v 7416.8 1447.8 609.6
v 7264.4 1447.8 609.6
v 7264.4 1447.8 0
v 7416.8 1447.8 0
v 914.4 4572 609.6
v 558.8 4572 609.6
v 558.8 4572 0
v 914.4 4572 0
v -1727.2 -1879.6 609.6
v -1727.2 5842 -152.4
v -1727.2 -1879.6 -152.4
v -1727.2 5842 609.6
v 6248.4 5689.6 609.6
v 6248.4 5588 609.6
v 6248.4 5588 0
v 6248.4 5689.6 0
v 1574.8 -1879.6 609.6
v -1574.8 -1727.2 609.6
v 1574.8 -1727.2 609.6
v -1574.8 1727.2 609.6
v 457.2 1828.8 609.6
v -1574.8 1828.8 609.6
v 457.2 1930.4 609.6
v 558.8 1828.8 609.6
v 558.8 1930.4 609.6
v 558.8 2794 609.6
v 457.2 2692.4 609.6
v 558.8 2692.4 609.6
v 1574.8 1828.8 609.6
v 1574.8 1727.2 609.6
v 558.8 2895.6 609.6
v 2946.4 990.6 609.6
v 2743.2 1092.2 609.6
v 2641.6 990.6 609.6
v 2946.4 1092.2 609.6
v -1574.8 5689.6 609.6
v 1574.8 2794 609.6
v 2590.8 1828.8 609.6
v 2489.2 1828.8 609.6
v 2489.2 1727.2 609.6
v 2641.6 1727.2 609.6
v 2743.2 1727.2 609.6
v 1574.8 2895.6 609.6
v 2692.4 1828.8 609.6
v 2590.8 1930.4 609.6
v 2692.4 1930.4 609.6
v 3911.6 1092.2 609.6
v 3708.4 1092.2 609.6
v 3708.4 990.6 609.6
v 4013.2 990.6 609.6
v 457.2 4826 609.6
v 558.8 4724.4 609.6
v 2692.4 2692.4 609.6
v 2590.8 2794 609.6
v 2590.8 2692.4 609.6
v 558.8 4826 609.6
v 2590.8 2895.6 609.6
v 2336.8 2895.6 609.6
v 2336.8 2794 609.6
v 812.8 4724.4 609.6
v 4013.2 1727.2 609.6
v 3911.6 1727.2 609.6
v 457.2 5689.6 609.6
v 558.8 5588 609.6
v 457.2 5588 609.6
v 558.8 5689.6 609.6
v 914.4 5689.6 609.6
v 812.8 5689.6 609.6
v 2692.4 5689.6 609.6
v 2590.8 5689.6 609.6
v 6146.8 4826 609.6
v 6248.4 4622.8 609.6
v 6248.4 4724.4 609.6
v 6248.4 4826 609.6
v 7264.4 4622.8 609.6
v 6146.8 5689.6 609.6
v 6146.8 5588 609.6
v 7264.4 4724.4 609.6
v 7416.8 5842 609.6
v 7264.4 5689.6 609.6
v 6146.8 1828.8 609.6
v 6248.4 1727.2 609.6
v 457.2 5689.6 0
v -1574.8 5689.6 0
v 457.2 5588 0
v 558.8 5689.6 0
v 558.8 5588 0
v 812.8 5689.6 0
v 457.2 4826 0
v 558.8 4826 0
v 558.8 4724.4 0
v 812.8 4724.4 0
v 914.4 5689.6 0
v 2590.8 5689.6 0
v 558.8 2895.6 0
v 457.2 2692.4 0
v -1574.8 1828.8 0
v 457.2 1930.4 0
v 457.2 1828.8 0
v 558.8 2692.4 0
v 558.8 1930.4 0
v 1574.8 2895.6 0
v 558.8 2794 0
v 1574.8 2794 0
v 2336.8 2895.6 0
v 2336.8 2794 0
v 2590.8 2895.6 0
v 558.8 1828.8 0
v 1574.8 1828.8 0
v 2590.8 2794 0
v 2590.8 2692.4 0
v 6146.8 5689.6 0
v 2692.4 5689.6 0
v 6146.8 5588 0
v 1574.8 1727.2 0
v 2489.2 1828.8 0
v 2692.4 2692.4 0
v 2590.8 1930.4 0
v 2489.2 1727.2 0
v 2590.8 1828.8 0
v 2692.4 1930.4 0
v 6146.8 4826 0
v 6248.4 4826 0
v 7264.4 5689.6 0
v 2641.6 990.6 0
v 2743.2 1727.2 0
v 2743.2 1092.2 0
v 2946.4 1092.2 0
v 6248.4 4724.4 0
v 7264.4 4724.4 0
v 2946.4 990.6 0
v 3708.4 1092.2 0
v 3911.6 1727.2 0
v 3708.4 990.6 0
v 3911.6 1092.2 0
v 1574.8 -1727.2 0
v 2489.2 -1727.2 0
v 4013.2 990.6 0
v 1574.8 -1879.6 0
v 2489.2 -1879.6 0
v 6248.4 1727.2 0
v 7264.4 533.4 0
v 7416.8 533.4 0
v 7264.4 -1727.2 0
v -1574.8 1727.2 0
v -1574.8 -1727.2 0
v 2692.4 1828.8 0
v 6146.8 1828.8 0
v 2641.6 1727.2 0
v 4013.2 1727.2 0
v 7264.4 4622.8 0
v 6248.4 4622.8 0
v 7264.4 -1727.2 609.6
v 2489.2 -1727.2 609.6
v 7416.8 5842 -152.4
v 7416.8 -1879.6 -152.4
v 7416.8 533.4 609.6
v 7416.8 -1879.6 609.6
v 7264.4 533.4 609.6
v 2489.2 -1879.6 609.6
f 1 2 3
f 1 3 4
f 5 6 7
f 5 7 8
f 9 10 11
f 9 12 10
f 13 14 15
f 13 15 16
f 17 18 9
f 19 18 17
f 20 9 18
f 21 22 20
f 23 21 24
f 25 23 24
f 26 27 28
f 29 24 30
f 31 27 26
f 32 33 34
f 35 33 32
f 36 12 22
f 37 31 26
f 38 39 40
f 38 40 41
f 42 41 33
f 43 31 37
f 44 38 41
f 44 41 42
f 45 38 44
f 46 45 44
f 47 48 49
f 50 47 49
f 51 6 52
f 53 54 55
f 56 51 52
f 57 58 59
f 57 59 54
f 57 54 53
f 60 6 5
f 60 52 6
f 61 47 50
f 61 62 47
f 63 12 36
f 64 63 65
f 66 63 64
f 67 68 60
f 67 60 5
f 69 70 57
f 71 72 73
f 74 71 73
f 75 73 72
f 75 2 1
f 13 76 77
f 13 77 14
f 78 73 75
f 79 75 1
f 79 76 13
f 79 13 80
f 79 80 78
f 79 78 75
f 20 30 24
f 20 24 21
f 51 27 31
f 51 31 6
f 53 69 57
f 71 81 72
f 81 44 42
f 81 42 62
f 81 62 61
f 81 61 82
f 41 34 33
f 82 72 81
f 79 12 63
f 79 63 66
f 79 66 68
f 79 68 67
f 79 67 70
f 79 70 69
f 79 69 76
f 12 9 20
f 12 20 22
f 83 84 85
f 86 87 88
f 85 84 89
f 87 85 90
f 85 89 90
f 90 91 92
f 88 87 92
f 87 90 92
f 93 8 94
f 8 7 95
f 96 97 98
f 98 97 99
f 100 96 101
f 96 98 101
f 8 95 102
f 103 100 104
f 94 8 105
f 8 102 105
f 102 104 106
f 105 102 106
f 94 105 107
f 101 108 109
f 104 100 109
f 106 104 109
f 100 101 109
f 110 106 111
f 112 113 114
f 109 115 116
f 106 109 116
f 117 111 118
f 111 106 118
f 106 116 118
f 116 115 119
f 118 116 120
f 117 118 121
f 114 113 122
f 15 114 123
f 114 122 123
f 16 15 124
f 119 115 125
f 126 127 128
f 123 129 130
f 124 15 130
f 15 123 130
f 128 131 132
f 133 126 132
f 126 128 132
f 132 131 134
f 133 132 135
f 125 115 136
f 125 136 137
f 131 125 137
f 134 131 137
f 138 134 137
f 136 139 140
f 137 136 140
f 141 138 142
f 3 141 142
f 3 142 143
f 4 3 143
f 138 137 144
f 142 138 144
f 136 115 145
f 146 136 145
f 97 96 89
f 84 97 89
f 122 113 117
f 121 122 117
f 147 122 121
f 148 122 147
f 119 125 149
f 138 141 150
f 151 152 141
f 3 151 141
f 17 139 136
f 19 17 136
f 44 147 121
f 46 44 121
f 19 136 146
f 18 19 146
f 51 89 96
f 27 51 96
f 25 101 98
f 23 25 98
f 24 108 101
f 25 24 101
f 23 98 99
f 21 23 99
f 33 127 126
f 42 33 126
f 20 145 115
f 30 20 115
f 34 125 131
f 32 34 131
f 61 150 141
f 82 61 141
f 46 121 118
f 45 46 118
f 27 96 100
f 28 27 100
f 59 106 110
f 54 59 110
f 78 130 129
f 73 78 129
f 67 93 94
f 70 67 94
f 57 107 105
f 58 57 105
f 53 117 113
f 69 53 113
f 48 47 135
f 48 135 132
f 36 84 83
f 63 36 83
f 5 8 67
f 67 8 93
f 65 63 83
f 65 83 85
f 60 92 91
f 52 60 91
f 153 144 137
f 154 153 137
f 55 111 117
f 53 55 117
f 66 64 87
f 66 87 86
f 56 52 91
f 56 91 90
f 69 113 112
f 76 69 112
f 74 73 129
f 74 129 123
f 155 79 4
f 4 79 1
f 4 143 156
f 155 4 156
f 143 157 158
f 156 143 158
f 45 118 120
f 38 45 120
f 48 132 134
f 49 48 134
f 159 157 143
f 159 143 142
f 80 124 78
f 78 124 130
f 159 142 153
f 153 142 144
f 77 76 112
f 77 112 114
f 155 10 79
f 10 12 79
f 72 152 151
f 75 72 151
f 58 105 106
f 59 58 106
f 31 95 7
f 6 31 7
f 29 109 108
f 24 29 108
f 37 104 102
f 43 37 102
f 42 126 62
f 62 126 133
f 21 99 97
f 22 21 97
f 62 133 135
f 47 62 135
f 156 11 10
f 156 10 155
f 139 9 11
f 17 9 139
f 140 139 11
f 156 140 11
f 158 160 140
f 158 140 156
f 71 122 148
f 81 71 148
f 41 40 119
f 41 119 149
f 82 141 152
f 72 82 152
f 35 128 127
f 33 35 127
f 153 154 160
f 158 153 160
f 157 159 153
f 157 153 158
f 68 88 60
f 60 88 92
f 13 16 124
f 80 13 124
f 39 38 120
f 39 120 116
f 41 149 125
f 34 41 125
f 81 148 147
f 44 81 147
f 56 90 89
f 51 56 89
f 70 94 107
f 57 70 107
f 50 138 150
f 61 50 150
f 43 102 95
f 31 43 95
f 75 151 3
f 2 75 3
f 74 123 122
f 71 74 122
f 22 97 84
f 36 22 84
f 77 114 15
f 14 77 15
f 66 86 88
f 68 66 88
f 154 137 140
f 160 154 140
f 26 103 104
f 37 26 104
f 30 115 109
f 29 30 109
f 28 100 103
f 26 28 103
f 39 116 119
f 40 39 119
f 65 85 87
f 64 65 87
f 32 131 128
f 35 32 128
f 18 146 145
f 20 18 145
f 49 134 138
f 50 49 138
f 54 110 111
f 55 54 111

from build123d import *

# Parameters (mm, degrees)
F1_DEPTH = 609.6
F2_W     = 9144
F2_H     = 7721.6
F3_DEPTH = 152.4


with BuildPart() as f1:
    # F0 (on Top) → F1 (new body)
    with BuildSketch(Plane.XY):
        Polygon((-1574.8, 1727.2), (1574.8, 1727.2), (1574.8, 1828.8), (558.8, 1828.8), (558.8, 1930.4), (457.2, 1930.4), (457.2, 1828.8), (-1574.8, 1828.8), (-1727.2, 1828.8), (-1727.2, -1879.6), (1574.8, -1879.6), (1574.8, -1727.2), (-1574.8, -1727.2), align=None)
        Polygon((-1727.2, 5842), (-1727.2, 1828.8), (-1574.8, 1828.8), (-1574.8, 5689.6), (457.2, 5689.6), (457.2, 5588), (558.8, 5588), (558.8, 5689.6), (812.8, 5689.6), (812.8, 4724.4), (558.8, 4724.4), (558.8, 4826), (457.2, 4826), (457.2, 4724.4), (457.2, 2692.4), (558.8, 2692.4), (558.8, 2794), (1574.8, 2794), (1574.8, 2895.6), (558.8, 2895.6), (558.8, 4572), (914.4, 4572), (914.4, 5689.6), (2590.8, 5689.6), (2590.8, 2895.6), (2336.8, 2895.6), (2336.8, 2794), (2590.8, 2794), (2590.8, 2692.4), (2692.4, 2692.4), (2692.4, 5689.6), (6146.8, 5689.6), (6146.8, 5588), (6248.4, 5588), (6248.4, 5689.6), (7264.4, 5689.6), (7264.4, 4724.4), (6248.4, 4724.4), (6248.4, 4826), (6146.8, 4826), (6146.8, 1828.8), (2692.4, 1828.8), (2692.4, 1930.4), (2590.8, 1930.4), (2590.8, 1828.8), (2489.2, 1828.8), (2489.2, 1727.2), (2641.6, 1727.2), (2641.6, 990.6), (2946.4, 990.6), (2946.4, 1092.2), (2743.2, 1092.2), (2743.2, 1727.2), (3911.6, 1727.2), (3911.6, 1092.2), (3708.4, 1092.2), (3708.4, 990.6), (4013.2, 990.6), (4013.2, 1727.2), (6248.4, 1727.2), (6248.4, 3430.751888), (6248.4, 4622.8), (7264.4, 4622.8), (7264.4, 1447.8), (7416.8, 1447.8), (7416.8, 5842), (2590.8, 5842), (1396.881529, 5842), align=None)
        Polygon((7264.4, -1727.2), (2489.2, -1727.2), (2489.2, -1879.6), (7416.8, -1879.6), (7416.8, 533.4), (7264.4, 533.4), align=None)
    extrude(amount=F1_DEPTH)

    # F2 (on face) → F3 (join)
    with BuildSketch(Plane(origin=(0, 0, 0), x_dir=(1, 0, 0), z_dir=(0, 0, -1))):
        with Locations((2844.8, -1981.2)):
            Rectangle(F2_W, F2_H)
    extrude(amount=F3_DEPTH)


solid = f1.part
